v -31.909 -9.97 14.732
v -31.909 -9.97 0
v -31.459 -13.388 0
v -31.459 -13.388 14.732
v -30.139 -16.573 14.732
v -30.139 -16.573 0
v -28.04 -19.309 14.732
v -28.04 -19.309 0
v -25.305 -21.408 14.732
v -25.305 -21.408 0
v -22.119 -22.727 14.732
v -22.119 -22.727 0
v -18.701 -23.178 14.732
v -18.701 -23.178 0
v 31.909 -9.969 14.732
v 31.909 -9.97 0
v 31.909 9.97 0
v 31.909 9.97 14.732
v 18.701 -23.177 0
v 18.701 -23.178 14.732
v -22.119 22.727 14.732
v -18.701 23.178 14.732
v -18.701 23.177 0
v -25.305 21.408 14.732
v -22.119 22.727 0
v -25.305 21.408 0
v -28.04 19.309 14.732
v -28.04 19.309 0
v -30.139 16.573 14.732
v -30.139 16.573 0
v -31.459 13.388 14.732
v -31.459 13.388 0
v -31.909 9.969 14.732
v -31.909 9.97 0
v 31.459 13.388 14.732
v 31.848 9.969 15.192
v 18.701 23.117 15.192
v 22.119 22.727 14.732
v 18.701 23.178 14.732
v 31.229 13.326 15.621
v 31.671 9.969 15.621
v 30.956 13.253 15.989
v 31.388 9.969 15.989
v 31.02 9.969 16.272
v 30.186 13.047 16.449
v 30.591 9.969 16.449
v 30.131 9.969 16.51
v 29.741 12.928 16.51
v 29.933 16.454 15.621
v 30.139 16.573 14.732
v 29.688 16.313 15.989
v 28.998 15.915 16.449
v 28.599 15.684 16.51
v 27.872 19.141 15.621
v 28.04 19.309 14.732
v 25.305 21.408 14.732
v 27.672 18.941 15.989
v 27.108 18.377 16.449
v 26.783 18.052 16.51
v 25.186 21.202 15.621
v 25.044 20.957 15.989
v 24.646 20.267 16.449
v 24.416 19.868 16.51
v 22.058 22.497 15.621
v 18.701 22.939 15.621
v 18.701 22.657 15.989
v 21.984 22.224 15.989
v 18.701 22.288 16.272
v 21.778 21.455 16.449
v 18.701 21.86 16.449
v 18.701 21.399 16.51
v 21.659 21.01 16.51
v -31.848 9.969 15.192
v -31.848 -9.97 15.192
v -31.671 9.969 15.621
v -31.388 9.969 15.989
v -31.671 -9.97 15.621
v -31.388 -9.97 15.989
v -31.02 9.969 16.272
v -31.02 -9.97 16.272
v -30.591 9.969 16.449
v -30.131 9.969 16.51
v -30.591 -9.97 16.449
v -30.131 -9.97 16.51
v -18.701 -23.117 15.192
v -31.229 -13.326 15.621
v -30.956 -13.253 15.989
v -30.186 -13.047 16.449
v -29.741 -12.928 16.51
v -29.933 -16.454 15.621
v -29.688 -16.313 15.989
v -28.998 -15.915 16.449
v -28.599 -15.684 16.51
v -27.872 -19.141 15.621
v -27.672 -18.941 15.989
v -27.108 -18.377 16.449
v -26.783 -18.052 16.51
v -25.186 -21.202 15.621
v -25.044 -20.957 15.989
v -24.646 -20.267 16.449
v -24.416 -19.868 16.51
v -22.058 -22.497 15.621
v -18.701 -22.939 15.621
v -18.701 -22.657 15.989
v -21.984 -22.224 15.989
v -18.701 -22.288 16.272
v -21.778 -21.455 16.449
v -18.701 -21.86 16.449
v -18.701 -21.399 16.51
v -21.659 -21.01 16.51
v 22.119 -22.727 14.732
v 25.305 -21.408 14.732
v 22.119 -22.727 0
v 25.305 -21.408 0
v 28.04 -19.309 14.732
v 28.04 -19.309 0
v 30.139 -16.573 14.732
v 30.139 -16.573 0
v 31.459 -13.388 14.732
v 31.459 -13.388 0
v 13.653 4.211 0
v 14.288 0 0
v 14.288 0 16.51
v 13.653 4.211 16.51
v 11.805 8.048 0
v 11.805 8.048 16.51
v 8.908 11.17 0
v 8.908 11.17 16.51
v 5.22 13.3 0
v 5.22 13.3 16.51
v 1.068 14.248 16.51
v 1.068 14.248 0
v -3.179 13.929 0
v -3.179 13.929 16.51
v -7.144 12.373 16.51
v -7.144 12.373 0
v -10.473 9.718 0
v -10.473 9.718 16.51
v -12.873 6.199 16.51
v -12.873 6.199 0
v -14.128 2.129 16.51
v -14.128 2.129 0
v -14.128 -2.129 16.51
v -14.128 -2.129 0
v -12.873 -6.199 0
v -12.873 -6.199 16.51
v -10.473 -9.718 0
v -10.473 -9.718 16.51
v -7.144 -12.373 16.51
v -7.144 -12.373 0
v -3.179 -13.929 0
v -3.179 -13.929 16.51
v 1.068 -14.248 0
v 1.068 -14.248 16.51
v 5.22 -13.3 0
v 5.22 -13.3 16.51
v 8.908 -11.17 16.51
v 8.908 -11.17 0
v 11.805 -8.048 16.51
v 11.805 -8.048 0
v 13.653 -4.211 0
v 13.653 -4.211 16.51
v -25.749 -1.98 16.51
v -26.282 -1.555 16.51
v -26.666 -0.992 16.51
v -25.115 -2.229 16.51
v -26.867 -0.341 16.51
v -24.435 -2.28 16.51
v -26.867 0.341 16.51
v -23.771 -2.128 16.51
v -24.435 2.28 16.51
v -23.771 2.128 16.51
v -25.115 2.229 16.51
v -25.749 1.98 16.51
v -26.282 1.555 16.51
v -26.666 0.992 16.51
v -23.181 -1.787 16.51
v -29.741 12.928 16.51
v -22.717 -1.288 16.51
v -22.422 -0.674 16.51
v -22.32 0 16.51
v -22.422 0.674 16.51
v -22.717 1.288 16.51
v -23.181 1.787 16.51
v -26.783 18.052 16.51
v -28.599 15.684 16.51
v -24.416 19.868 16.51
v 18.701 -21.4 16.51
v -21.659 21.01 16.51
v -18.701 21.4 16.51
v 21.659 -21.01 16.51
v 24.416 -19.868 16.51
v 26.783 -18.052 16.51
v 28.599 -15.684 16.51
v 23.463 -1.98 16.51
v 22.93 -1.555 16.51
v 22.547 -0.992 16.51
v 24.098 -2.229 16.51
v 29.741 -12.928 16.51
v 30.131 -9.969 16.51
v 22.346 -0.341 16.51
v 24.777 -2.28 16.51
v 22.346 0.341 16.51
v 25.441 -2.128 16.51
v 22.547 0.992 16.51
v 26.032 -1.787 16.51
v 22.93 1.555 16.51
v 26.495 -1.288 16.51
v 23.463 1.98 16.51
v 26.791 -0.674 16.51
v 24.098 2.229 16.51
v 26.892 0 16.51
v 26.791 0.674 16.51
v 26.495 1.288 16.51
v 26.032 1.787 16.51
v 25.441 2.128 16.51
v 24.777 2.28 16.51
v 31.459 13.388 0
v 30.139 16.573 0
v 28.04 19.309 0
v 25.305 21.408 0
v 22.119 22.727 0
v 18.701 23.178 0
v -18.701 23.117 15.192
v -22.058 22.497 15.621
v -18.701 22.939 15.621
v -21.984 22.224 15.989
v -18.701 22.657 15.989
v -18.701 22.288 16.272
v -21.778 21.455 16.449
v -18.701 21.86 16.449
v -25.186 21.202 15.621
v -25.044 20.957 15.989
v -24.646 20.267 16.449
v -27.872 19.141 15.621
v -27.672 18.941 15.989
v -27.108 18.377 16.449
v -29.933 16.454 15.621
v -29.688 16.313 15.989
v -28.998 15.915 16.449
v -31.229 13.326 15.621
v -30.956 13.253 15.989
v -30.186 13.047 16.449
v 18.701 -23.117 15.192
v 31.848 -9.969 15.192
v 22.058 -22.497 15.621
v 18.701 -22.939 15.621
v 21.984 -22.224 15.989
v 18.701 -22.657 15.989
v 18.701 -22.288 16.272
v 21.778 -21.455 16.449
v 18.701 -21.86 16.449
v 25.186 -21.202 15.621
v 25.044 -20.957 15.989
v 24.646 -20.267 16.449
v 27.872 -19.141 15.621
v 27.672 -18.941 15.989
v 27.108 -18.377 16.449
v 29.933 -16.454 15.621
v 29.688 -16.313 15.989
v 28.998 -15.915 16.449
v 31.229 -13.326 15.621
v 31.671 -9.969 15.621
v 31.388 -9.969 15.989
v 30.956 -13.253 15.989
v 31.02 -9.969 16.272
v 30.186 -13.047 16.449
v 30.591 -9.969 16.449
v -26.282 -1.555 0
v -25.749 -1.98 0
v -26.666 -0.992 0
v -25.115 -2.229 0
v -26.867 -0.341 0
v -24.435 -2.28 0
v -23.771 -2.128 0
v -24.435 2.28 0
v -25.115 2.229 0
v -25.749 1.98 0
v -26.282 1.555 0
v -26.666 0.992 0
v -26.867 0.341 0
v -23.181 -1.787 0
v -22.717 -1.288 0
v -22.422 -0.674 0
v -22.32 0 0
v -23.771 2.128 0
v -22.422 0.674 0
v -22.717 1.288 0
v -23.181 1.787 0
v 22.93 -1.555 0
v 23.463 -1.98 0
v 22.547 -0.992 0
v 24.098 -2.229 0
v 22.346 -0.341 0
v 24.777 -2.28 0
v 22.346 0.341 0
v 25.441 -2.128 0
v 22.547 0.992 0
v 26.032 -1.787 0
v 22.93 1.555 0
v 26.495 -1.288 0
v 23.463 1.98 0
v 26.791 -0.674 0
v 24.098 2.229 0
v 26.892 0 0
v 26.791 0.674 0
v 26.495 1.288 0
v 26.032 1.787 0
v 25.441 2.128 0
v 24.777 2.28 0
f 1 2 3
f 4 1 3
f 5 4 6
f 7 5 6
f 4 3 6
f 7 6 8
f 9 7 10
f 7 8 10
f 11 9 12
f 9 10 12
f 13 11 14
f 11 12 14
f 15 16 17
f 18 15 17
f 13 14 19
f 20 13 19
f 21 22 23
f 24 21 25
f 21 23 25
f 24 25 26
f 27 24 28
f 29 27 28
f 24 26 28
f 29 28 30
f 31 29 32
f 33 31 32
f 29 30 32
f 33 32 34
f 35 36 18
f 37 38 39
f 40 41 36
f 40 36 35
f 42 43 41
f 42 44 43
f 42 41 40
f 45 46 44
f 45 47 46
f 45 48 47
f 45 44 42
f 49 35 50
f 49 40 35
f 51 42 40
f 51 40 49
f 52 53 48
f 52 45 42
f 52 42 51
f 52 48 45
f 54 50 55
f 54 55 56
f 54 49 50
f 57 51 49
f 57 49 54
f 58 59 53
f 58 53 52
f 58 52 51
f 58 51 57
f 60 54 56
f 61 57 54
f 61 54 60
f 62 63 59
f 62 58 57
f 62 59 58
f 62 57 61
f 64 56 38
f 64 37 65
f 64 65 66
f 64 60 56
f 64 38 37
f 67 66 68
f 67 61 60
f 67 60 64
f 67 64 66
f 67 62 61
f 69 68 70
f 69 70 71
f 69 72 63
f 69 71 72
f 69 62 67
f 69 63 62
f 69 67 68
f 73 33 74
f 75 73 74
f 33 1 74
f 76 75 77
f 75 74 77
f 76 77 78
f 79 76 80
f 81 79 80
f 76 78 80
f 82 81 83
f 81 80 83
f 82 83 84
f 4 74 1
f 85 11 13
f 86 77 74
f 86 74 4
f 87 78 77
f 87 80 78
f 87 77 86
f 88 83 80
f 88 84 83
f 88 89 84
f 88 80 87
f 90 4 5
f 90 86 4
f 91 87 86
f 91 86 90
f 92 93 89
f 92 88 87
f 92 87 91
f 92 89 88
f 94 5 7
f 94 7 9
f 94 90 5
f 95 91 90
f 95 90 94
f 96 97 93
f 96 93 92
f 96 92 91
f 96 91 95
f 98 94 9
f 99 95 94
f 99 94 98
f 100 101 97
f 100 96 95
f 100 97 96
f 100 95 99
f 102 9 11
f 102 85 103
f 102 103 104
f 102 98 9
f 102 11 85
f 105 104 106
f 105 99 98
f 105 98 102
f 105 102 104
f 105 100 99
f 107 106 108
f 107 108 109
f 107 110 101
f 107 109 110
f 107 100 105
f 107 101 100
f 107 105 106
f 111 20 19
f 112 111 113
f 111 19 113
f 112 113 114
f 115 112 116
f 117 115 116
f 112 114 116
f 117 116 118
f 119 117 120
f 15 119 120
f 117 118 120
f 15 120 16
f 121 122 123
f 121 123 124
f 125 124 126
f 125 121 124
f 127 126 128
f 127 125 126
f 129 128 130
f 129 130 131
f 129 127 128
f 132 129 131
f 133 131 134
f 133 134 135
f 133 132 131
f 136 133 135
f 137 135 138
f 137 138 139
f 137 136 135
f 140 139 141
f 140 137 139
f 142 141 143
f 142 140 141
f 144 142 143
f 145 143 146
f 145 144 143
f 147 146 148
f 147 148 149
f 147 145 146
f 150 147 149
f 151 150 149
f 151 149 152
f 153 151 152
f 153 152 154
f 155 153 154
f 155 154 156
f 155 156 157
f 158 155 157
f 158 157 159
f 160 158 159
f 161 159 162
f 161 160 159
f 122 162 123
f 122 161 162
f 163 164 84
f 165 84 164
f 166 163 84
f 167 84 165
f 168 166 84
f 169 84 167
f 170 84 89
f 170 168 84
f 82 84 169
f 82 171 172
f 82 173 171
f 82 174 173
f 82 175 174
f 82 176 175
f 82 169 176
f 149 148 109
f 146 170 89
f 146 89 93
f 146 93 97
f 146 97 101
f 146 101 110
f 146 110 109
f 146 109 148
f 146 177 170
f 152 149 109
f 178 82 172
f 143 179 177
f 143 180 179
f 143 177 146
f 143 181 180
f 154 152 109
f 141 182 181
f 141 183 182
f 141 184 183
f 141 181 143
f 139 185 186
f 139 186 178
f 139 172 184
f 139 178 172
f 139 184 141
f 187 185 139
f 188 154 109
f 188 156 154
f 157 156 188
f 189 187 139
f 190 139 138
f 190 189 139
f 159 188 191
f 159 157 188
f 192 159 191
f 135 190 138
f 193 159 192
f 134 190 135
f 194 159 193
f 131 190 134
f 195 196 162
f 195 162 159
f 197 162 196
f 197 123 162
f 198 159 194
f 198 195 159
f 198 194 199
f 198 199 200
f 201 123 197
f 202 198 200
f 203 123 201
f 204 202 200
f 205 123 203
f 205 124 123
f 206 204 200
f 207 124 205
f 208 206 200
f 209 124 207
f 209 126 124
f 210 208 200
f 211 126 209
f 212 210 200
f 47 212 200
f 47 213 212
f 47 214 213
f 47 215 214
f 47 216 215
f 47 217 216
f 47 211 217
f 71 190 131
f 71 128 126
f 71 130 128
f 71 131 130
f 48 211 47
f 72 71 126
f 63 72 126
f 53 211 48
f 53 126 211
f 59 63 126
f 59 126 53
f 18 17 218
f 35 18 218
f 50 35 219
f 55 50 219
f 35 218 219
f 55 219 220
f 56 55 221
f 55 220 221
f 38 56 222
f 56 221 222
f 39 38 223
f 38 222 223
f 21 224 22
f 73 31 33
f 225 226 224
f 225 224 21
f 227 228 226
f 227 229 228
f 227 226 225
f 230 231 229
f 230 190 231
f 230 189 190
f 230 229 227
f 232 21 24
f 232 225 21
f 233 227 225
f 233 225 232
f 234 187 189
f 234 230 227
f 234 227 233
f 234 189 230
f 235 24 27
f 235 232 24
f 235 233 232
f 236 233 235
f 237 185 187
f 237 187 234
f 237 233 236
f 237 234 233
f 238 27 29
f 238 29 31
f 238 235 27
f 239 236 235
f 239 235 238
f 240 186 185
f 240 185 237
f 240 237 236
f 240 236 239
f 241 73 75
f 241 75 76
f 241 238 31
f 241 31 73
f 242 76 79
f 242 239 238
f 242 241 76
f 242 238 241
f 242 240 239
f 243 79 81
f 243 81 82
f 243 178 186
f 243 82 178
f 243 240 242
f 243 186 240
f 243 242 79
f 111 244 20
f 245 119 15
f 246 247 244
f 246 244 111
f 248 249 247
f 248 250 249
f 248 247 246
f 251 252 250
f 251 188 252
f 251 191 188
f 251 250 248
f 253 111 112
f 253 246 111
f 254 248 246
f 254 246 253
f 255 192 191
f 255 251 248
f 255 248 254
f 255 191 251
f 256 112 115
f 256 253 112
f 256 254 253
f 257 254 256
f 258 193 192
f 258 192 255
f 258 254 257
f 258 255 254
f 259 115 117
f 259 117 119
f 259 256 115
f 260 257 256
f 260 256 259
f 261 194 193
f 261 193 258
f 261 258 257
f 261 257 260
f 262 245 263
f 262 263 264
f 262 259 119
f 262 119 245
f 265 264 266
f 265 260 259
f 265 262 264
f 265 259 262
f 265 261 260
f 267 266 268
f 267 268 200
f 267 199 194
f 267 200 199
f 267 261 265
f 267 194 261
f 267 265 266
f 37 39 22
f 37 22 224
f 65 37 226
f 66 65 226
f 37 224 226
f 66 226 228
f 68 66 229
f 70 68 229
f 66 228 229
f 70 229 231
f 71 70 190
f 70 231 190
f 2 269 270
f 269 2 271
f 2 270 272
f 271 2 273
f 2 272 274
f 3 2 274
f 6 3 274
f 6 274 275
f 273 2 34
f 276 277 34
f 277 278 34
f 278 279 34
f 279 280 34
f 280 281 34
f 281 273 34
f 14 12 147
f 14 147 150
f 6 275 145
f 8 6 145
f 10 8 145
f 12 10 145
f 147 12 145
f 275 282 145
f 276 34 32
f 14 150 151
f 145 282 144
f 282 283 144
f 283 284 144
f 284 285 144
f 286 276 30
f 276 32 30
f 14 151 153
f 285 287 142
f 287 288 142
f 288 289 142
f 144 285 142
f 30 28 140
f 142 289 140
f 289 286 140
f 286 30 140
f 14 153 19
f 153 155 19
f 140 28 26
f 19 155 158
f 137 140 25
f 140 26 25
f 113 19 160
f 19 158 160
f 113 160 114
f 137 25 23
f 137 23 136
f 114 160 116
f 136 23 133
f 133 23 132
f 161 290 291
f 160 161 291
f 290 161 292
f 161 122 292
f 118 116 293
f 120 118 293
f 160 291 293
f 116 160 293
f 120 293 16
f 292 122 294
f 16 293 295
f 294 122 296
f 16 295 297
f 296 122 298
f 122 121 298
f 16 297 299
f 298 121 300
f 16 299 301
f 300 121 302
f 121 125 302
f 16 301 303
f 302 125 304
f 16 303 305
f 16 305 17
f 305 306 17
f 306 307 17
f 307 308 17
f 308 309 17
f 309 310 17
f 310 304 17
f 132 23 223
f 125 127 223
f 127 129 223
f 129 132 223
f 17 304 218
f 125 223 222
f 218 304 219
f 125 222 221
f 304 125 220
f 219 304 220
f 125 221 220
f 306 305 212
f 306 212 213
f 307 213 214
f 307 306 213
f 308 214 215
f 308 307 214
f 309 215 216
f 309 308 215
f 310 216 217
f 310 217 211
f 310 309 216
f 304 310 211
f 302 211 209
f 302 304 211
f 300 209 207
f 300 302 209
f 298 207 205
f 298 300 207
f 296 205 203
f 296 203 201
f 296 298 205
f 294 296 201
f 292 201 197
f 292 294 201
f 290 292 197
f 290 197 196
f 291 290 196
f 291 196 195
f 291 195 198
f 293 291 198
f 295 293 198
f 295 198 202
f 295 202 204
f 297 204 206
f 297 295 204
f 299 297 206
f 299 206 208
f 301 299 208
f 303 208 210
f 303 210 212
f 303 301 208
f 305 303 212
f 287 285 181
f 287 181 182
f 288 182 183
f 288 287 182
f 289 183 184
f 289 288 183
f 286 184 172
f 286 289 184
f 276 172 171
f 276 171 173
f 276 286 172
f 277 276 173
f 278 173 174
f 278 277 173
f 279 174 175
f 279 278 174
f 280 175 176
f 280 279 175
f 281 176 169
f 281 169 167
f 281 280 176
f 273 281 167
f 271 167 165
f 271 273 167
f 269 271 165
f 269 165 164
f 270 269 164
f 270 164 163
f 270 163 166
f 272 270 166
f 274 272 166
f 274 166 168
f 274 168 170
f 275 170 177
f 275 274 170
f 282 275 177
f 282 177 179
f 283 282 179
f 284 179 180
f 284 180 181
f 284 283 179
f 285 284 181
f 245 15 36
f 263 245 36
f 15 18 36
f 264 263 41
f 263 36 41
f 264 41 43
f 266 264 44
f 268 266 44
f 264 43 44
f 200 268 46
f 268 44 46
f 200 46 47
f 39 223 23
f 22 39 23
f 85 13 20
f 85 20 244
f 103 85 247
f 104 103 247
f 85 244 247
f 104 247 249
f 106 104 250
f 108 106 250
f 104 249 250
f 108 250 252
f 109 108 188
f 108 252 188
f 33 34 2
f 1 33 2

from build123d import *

# Parameters (mm, degrees)
F0_R     = 2.286
F0_R_2   = 14.2875
F1_DEPTH = 16.51
F2_R     = 1.778


with BuildPart() as f1:
    # F0 (on Top) → F1 (new body)
    with BuildSketch(Plane.XY):
        with BuildLine():
            Line((-18.70075, -23.1775), (18.70075, -23.1775))
            ThreePointArc((18.70075, -23.1775), (28.0402163659, -19.3089663659), (31.90875, -9.9695))
            Line((31.90875, -9.9695), (31.90875, 9.9695))
            ThreePointArc((31.90875, 9.9695), (28.0402163659, 19.3089663659), (18.70075, 23.1775))
            Line((18.70075, 23.1775), (-18.70075, 23.1775))
            ThreePointArc((-18.70075, 23.1775), (-28.0402163659, 19.3089663659), (-31.90875, 9.9695))
            Line((-31.90875, 9.9695), (-31.90875, -9.9695))
            ThreePointArc((-31.90875, -9.9695), (-28.0402163659, -19.3089663659), (-18.70075, -23.1775))
        make_face()
        with BuildLine():
            Line((-18.70075, 20.6375), (18.70075, 20.6375))
            ThreePointArc((18.70075, 20.6375), (26.2441651417, 17.5129151417), (29.36875, 9.9695))
            Line((29.36875, 9.9695), (29.36875, -9.9695))
            ThreePointArc((29.36875, -9.9695), (26.2441651417, -17.5129151417), (18.70075, -20.6375))
            Line((18.70075, -20.6375), (-18.70075, -20.6375))
            ThreePointArc((-18.70075, -20.6375), (-26.2441651417, -17.5129151417), (-29.36875, -9.9695))
            Line((-29.36875, -9.9695), (-29.36875, 9.9695))
            ThreePointArc((-29.36875, 9.9695), (-26.2441651417, 17.5129151417), (-18.70075, 20.6375))
        make_face(mode=Mode.SUBTRACT)
        with BuildLine():
            ThreePointArc((29.36875, 9.9695), (26.2441651417, 17.5129151417), (18.70075, 20.6375))
            Line((18.70075, 20.6375), (-18.70075, 20.6375))
            ThreePointArc((-18.70075, 20.6375), (-26.2441651417, 17.5129151417), (-29.36875, 9.9695))
            Line((-29.36875, 9.9695), (-29.36875, -9.9695))
            ThreePointArc((-29.36875, -9.9695), (-26.2441651417, -17.5129151417), (-18.70075, -20.6375))
            Line((-18.70075, -20.6375), (18.70075, -20.6375))
            ThreePointArc((18.70075, -20.6375), (26.2441651417, -17.5129151417), (29.36875, -9.9695))
            Line((29.36875, -9.9695), (29.36875, 9.9695))
        make_face()
        with Locations((-24.60625, 0)):
            Circle(F0_R, mode=Mode.SUBTRACT)
        Circle(F0_R_2, mode=Mode.SUBTRACT)
        with Locations((24.60625, 0)):
            Circle(F0_R, mode=Mode.SUBTRACT)
    extrude(amount=F1_DEPTH)

    # F2
    f2_edges = [f1.edges().sort_by_distance(p)[0] for p in [
        (28.040216, 19.308966, 16.51),
    ]]
    fillet(f2_edges, radius=F2_R)


solid = f1.part
